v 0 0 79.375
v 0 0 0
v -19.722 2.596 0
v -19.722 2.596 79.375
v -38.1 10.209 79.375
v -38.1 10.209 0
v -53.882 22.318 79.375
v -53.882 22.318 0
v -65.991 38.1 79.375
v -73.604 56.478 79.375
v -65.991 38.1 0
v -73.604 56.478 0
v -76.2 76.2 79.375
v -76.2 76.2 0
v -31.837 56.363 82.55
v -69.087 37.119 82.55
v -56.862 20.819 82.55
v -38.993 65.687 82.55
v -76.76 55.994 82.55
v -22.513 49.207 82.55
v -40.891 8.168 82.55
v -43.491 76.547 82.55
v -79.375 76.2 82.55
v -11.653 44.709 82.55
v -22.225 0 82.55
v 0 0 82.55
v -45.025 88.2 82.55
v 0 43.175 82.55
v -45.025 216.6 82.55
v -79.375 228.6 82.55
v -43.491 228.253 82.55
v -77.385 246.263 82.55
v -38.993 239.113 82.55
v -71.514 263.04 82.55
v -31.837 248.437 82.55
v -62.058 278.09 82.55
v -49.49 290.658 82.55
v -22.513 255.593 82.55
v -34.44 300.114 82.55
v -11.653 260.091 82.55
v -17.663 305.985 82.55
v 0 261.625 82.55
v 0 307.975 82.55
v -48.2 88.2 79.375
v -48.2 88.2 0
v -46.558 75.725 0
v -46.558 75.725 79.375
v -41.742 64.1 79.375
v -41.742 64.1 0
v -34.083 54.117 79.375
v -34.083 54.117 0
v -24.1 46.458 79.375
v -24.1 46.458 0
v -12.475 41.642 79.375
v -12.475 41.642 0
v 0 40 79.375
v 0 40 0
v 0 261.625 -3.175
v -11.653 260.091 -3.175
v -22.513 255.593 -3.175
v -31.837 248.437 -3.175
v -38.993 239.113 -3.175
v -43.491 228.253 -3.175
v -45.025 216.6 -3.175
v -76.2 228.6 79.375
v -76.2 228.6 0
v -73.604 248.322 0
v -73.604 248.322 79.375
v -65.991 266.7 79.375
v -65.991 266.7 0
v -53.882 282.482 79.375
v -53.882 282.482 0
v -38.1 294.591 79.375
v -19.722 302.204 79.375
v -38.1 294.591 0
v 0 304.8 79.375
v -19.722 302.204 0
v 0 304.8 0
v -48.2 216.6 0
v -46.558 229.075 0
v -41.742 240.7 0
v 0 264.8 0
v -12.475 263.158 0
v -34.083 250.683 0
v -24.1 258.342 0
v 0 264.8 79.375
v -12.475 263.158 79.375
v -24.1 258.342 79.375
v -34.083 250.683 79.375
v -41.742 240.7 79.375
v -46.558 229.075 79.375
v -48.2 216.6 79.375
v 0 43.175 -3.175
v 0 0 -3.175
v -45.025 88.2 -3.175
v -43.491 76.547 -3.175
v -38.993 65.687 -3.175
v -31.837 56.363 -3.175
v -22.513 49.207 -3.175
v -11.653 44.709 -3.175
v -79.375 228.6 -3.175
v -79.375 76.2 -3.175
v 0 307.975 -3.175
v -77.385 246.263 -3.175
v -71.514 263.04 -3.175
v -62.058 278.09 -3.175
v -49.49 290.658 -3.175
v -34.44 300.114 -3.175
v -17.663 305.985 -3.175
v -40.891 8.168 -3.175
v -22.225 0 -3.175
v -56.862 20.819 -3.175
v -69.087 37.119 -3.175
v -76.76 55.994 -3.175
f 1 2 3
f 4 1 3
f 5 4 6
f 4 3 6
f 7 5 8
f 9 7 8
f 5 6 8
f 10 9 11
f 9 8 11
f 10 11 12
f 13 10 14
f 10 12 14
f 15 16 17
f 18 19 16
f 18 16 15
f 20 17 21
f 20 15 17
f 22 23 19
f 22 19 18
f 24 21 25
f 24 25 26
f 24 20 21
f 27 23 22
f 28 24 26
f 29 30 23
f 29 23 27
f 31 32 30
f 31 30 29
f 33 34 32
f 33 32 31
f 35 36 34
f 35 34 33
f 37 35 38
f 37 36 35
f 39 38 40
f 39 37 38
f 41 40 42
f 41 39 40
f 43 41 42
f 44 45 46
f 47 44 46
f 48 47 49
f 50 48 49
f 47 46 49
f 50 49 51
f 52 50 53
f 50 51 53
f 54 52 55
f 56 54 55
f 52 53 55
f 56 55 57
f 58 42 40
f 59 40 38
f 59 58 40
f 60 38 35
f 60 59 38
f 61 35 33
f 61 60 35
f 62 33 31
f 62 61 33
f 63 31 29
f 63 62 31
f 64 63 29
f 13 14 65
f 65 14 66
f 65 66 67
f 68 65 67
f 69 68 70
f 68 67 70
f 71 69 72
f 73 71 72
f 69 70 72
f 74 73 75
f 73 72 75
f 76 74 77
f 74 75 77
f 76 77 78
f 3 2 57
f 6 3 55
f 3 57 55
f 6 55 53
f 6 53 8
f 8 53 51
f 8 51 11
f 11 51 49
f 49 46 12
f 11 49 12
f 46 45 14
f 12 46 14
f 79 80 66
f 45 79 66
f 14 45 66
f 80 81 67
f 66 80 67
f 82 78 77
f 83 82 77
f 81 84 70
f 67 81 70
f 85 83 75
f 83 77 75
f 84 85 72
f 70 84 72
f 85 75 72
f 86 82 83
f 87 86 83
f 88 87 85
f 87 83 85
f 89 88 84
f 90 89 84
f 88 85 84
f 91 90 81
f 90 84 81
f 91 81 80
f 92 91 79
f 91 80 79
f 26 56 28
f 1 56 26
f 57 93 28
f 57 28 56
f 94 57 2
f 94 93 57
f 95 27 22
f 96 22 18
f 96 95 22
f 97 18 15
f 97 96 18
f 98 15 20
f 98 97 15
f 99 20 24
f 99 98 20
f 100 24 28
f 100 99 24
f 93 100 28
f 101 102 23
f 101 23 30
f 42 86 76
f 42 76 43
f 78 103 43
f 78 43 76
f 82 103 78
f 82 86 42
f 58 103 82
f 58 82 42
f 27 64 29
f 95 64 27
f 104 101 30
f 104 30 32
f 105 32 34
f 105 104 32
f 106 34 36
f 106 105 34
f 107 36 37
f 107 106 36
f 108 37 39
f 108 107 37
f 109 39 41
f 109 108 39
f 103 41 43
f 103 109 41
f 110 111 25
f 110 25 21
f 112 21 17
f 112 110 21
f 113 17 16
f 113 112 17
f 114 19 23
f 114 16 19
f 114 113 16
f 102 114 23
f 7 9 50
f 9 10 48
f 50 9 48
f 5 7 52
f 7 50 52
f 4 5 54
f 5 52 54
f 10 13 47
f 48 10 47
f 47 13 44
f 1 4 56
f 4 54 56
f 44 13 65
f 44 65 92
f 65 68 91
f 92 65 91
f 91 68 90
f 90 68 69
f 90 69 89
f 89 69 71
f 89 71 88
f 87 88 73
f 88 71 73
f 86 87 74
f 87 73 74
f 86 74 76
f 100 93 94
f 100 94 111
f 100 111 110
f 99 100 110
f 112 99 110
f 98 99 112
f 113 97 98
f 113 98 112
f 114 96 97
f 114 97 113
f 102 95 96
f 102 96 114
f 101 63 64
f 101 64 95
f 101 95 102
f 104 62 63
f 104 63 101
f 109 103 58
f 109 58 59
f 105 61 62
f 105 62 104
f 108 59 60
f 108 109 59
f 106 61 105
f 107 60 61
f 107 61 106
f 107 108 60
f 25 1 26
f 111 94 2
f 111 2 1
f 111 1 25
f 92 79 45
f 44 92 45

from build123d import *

# Parameters (mm, degrees)
BOSS_EXTRUDE1_DEPTH   = 79.375
BOSS_EXTRUDE1_2_DEPTH = 79.375
BOSS_EXTRUDE2_DEPTH   = 3.175
BOSS_EXTRUDE3_START   = 3.175
BOSS_EXTRUDE3_DEPTH   = 3.175


with BuildPart() as part:
    # Sketch2 → Boss-Extrude1 (new body)
    with BuildSketch(Plane.XY):
        with BuildLine():
            Line((0, 304.8), (0, 307.975))
            ThreePointArc((0, 307.975), (-56.126600757, 284.726600757), (-79.375, 228.6))
            Line((-79.375, 228.6), (-79.375, 76.2))
            ThreePointArc((-79.375, 76.2), (-63.5, 28.575), (-22.225, 0))
            Line((-22.225, 0), (0, 0))
            ThreePointArc((0, 0), (-53.881536726, 22.318463274), (-76.2, 76.2))
            Line((-76.2, 76.2), (-76.2, 228.6))
            ThreePointArc((-76.2, 228.6), (-53.881536726, 282.481536726), (0, 304.8))
        make_face()
    extrude(amount=BOSS_EXTRUDE1_DEPTH)



with BuildPart() as body_2:
    # Sketch2 → Boss-Extrude1 2 (new body)
    with BuildSketch(Plane.XY):
        with BuildLine():
            ThreePointArc((-48.2, 88.2), (-34.082546853, 54.117453147), (0, 40))
            Line((0, 40), (0, 43.175))
            ThreePointArc((0, 43.175), (-31.837482823, 56.362517177), (-45.025, 88.2))
            Line((-45.025, 88.2), (-45.025, 216.6))
            ThreePointArc((-45.025, 216.6), (-31.837482823, 248.437482823), (0, 261.625))
            Line((0, 261.625), (0, 264.8))
            ThreePointArc((0, 264.8), (-34.082546853, 250.682546853), (-48.2, 216.6))
            Line((-48.2, 216.6), (-48.2, 88.2))
        make_face()
    extrude(amount=BOSS_EXTRUDE1_2_DEPTH)


with BuildPart() as part_1:
    add(part.part)

    add(body_2.part)  # Boss-Extrude2 merges body 2
    # Sketch3 → Boss-Extrude2 (add)
    with BuildSketch(Plane.XY.offset(79.375)):
        with BuildLine():
            Line((-45.025, 88.2), (-45.025, 216.6))
            ThreePointArc((-45.025, 216.6), (-31.837482823, 248.437482823), (0, 261.625))
            Line((0, 261.625), (0, 307.975))
            ThreePointArc((0, 307.975), (-56.126600757, 284.726600757), (-79.375, 228.6))
            Line((-79.375, 228.6), (-79.375, 76.2))
            ThreePointArc((-79.375, 76.2), (-63.5, 28.575), (-22.225, 0))
            Line((-22.225, 0), (0, 0))
            Line((0, 0), (0, 43.175))
            ThreePointArc((0, 43.175), (-31.837482823, 56.362517177), (-45.025, 88.2))
        make_face()
    extrude(amount=BOSS_EXTRUDE2_DEPTH)

    # Sketch4 → Boss-Extrude3 (add)
    with BuildSketch(Plane(origin=(0, 0, 0), x_dir=(-1, 0, 0), z_dir=(0, 0, -1)).offset(BOSS_EXTRUDE3_START)):
        with BuildLine():
            Line((79.375, 76.2), (79.375, 228.6))
            ThreePointArc((79.375, 228.6), (56.126600757, 284.726600757), (0, 307.975))
            Line((0, 307.975), (0, 261.625))
            ThreePointArc((0, 261.625), (31.837482823, 248.437482823), (45.025, 216.6))
            Line((45.025, 216.6), (45.025, 88.2))
            ThreePointArc((45.025, 88.2), (31.837482823, 56.362517177), (0, 43.175))
            Line((0, 43.175), (0, 0))
            Line((0, 0), (22.225, 0))
            ThreePointArc((22.225, 0), (63.5, 28.575), (79.375, 76.2))
        make_face()
    extrude(amount=-BOSS_EXTRUDE3_DEPTH)


solid = part_1.part
